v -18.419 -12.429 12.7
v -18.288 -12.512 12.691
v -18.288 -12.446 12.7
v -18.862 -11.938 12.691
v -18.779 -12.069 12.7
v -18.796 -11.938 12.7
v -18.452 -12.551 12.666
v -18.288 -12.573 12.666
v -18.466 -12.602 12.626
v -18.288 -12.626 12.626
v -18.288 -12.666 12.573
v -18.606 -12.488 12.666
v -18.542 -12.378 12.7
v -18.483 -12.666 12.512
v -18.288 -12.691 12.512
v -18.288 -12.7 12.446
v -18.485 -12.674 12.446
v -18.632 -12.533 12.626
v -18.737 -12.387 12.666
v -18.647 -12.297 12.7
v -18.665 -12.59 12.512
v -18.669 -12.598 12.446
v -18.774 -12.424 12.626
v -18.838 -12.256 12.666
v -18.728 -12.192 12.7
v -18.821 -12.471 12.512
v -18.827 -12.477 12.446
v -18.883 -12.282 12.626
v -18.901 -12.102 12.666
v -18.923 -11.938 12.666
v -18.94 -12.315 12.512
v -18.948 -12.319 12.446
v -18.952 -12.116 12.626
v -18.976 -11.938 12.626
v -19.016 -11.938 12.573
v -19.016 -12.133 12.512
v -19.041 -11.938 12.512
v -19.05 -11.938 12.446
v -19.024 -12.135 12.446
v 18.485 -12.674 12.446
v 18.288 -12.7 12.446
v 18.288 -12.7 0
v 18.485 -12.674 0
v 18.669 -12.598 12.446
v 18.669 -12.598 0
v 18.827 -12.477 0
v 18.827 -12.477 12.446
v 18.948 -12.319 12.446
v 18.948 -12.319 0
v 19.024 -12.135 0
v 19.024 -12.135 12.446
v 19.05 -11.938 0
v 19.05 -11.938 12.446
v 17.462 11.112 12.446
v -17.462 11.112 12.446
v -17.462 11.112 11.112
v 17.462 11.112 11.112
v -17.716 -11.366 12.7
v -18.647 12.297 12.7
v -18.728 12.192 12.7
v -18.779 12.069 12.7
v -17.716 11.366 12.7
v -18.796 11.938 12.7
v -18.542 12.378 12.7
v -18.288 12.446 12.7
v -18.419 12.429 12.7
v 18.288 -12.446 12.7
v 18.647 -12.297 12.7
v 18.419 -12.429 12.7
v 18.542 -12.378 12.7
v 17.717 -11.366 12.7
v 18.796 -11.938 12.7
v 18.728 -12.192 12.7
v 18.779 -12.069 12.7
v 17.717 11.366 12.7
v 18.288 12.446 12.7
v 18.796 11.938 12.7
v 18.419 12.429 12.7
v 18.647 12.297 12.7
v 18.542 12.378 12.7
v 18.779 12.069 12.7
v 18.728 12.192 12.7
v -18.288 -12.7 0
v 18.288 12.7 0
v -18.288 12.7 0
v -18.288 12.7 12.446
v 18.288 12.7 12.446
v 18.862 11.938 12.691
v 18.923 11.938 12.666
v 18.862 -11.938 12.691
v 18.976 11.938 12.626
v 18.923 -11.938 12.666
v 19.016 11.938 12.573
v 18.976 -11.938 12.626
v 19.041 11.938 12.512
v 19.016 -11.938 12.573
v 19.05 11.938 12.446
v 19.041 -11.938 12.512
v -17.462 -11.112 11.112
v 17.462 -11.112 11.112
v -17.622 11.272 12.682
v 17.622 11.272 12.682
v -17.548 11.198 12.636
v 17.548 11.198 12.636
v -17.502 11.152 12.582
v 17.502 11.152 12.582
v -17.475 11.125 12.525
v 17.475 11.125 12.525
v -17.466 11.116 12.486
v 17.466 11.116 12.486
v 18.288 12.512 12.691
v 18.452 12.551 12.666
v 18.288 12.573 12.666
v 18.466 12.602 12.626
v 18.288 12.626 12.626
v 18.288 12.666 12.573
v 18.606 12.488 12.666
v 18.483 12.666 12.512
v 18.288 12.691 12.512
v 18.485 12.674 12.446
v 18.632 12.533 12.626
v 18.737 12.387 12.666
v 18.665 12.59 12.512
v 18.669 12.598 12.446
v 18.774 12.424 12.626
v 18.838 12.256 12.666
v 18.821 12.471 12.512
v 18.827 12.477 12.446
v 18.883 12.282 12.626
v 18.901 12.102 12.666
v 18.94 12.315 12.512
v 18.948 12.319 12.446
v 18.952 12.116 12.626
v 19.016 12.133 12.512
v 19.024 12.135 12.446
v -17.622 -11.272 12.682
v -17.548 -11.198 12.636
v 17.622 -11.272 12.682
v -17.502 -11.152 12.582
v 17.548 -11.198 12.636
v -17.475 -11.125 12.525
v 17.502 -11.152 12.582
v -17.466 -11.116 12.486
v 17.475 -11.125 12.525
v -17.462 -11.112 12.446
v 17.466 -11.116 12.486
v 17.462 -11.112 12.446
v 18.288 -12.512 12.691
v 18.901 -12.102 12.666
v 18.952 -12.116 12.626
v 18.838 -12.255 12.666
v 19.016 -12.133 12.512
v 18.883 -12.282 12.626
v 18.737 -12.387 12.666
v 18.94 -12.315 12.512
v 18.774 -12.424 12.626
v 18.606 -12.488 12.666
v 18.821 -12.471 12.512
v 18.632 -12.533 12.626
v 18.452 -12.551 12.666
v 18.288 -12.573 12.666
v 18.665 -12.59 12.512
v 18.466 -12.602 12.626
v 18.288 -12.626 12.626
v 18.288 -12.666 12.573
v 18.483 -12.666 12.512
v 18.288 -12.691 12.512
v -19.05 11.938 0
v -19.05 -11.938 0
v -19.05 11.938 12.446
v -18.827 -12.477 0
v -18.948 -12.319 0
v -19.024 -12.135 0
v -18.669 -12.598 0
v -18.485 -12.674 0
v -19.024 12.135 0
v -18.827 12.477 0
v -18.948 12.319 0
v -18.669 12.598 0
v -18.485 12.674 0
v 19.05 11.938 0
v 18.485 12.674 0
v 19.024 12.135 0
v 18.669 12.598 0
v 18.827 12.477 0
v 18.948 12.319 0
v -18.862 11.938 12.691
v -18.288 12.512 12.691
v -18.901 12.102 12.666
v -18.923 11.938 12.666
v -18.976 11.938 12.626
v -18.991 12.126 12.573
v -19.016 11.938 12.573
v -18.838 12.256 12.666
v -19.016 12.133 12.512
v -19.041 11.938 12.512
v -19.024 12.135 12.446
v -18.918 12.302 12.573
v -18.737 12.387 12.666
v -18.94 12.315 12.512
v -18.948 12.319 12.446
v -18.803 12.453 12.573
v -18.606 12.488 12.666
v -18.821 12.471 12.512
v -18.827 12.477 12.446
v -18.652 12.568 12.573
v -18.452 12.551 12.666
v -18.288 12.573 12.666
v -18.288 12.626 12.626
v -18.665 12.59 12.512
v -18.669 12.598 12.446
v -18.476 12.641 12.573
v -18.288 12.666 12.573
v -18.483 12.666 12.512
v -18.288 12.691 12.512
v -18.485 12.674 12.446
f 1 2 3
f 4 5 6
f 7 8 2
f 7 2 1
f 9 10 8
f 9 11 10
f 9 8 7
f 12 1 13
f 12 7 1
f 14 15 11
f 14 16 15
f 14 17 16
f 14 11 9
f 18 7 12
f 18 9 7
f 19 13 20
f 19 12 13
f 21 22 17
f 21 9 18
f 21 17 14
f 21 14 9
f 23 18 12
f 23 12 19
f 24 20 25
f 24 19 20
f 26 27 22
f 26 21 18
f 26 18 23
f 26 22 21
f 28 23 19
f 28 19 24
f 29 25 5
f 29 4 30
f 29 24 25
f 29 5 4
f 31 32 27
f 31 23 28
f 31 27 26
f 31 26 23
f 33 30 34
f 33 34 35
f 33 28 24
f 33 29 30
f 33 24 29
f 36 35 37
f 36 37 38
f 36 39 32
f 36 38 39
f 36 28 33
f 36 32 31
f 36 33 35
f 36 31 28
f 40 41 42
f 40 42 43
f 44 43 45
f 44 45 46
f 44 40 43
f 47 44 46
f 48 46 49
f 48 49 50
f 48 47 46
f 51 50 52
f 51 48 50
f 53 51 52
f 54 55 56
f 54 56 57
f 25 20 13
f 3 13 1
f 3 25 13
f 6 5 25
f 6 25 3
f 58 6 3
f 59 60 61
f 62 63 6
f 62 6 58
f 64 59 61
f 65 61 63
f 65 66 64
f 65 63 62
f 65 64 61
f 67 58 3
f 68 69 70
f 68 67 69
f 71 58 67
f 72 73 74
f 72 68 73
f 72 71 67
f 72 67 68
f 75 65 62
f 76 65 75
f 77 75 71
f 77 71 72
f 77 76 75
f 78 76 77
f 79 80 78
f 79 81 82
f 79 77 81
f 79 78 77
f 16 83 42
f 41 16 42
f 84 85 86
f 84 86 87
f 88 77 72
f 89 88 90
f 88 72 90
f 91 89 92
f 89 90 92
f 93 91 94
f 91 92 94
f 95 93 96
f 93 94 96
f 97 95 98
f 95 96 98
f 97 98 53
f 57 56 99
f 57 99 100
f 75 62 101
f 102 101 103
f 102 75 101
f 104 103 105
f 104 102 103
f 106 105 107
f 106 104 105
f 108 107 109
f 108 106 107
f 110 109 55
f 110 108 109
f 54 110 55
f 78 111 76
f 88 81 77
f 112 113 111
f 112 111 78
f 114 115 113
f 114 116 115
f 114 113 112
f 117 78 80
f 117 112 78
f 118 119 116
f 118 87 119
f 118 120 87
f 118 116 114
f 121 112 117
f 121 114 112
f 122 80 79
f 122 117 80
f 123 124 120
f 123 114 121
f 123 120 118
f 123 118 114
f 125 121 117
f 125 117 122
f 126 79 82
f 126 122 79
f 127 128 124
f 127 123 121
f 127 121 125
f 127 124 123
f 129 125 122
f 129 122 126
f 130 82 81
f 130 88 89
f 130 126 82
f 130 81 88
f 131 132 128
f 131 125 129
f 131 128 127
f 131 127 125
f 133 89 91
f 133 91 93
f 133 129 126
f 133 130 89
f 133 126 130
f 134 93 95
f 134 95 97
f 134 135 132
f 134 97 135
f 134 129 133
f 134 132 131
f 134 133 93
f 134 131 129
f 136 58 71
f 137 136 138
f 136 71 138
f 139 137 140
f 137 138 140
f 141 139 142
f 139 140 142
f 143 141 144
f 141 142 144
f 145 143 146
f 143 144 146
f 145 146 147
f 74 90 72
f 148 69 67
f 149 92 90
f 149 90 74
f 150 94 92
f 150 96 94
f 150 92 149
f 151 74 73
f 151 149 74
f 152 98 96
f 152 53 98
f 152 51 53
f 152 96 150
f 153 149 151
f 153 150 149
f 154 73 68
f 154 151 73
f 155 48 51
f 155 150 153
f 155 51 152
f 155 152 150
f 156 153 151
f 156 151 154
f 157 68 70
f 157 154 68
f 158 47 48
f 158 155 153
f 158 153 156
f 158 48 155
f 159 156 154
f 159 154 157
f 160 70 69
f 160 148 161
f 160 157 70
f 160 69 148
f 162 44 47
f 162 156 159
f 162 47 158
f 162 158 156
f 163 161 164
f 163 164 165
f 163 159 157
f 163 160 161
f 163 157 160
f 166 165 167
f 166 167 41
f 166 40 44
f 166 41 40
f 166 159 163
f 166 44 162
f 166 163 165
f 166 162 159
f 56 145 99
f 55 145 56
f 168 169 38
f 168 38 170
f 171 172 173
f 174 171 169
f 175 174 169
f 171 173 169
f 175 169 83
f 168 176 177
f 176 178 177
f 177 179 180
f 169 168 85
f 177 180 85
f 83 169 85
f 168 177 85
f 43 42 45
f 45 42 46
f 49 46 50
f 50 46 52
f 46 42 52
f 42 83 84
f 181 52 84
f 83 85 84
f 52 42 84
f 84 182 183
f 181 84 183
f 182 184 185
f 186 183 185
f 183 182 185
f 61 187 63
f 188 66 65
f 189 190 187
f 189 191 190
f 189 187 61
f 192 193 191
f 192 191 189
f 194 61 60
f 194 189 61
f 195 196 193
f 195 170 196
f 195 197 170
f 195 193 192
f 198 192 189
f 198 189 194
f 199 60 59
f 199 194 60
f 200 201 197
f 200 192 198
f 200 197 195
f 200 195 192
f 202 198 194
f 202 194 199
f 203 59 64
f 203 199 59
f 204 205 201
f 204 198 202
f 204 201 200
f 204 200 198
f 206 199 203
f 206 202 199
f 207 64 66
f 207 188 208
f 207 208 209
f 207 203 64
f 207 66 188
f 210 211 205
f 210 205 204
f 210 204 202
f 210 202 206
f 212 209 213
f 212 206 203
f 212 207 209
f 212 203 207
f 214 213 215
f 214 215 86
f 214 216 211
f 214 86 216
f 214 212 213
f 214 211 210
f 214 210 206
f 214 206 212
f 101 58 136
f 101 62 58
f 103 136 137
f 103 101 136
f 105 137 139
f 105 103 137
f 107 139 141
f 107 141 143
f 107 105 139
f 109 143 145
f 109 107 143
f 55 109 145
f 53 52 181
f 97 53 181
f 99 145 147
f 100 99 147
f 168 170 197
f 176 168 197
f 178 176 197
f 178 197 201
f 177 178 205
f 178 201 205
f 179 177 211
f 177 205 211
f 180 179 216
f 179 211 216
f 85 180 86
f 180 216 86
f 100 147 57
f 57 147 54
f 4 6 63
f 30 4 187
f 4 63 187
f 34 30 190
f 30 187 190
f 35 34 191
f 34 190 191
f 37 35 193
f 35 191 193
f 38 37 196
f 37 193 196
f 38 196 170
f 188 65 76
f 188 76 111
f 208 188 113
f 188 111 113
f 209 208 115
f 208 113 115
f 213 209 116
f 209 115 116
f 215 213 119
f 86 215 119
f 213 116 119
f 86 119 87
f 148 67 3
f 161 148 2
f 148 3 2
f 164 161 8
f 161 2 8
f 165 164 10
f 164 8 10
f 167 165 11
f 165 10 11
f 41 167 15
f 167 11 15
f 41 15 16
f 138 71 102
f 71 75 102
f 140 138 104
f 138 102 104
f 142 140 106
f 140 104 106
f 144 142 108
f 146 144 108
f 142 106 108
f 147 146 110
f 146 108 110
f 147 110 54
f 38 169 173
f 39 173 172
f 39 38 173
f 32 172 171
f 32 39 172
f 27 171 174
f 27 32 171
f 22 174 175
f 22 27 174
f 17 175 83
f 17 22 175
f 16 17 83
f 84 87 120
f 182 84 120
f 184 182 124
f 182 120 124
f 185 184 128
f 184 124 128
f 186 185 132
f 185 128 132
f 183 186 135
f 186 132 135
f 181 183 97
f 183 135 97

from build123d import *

# Parameters (mm, degrees)
F0_W     = 38.1
F0_H     = 25.4
F1_DEPTH = 12.7
F2_W     = 34.925
F2_H     = 22.225
F3_DEPTH = 1.5875
F4_R     = 0.762
F5_R     = 0.254


with BuildPart() as f1:
    # F0 (on Top) → F1 (new body)
    with BuildSketch(Plane.XY):
        Rectangle(F0_W, F0_H)
    extrude(amount=F1_DEPTH)

    # F2 (on face) → F3 (cut)
    with BuildSketch(Plane.XY.offset(12.7)):
        Rectangle(F2_W, F2_H)
    extrude(amount=-F3_DEPTH, mode=Mode.SUBTRACT)

    # F4
    f4_edges = [f1.edges().sort_by_distance(p)[0] for p in [
        (-19.05, -12.7, 6.35),
        (-19.05, 12.7, 6.35),
        (19.05, 12.7, 6.35),
        (19.05, -12.7, 6.35),
    ]]
    fillet(f4_edges, radius=F4_R)

    # F5
    f5_edges = [f1.edges().sort_by_distance(p)[0] for p in [
        (0, 12.7, 12.7),
        (18.826815, 12.476815, 12.7),
        (-18.826815, 12.476815, 12.7),
        (19.05, 0, 12.7),
        (-19.05, 0, 12.7),
        (18.826815, -12.476815, 12.7),
        (-18.826815, -12.476815, 12.7),
        (0, -12.7, 12.7),
        (0, 11.1125, 12.7),
        (-17.4625, 0, 12.7),
        (0, -11.1125, 12.7),
        (17.4625, 0, 12.7),
    ]]
    fillet(f5_edges, radius=F5_R)


solid = f1.part
